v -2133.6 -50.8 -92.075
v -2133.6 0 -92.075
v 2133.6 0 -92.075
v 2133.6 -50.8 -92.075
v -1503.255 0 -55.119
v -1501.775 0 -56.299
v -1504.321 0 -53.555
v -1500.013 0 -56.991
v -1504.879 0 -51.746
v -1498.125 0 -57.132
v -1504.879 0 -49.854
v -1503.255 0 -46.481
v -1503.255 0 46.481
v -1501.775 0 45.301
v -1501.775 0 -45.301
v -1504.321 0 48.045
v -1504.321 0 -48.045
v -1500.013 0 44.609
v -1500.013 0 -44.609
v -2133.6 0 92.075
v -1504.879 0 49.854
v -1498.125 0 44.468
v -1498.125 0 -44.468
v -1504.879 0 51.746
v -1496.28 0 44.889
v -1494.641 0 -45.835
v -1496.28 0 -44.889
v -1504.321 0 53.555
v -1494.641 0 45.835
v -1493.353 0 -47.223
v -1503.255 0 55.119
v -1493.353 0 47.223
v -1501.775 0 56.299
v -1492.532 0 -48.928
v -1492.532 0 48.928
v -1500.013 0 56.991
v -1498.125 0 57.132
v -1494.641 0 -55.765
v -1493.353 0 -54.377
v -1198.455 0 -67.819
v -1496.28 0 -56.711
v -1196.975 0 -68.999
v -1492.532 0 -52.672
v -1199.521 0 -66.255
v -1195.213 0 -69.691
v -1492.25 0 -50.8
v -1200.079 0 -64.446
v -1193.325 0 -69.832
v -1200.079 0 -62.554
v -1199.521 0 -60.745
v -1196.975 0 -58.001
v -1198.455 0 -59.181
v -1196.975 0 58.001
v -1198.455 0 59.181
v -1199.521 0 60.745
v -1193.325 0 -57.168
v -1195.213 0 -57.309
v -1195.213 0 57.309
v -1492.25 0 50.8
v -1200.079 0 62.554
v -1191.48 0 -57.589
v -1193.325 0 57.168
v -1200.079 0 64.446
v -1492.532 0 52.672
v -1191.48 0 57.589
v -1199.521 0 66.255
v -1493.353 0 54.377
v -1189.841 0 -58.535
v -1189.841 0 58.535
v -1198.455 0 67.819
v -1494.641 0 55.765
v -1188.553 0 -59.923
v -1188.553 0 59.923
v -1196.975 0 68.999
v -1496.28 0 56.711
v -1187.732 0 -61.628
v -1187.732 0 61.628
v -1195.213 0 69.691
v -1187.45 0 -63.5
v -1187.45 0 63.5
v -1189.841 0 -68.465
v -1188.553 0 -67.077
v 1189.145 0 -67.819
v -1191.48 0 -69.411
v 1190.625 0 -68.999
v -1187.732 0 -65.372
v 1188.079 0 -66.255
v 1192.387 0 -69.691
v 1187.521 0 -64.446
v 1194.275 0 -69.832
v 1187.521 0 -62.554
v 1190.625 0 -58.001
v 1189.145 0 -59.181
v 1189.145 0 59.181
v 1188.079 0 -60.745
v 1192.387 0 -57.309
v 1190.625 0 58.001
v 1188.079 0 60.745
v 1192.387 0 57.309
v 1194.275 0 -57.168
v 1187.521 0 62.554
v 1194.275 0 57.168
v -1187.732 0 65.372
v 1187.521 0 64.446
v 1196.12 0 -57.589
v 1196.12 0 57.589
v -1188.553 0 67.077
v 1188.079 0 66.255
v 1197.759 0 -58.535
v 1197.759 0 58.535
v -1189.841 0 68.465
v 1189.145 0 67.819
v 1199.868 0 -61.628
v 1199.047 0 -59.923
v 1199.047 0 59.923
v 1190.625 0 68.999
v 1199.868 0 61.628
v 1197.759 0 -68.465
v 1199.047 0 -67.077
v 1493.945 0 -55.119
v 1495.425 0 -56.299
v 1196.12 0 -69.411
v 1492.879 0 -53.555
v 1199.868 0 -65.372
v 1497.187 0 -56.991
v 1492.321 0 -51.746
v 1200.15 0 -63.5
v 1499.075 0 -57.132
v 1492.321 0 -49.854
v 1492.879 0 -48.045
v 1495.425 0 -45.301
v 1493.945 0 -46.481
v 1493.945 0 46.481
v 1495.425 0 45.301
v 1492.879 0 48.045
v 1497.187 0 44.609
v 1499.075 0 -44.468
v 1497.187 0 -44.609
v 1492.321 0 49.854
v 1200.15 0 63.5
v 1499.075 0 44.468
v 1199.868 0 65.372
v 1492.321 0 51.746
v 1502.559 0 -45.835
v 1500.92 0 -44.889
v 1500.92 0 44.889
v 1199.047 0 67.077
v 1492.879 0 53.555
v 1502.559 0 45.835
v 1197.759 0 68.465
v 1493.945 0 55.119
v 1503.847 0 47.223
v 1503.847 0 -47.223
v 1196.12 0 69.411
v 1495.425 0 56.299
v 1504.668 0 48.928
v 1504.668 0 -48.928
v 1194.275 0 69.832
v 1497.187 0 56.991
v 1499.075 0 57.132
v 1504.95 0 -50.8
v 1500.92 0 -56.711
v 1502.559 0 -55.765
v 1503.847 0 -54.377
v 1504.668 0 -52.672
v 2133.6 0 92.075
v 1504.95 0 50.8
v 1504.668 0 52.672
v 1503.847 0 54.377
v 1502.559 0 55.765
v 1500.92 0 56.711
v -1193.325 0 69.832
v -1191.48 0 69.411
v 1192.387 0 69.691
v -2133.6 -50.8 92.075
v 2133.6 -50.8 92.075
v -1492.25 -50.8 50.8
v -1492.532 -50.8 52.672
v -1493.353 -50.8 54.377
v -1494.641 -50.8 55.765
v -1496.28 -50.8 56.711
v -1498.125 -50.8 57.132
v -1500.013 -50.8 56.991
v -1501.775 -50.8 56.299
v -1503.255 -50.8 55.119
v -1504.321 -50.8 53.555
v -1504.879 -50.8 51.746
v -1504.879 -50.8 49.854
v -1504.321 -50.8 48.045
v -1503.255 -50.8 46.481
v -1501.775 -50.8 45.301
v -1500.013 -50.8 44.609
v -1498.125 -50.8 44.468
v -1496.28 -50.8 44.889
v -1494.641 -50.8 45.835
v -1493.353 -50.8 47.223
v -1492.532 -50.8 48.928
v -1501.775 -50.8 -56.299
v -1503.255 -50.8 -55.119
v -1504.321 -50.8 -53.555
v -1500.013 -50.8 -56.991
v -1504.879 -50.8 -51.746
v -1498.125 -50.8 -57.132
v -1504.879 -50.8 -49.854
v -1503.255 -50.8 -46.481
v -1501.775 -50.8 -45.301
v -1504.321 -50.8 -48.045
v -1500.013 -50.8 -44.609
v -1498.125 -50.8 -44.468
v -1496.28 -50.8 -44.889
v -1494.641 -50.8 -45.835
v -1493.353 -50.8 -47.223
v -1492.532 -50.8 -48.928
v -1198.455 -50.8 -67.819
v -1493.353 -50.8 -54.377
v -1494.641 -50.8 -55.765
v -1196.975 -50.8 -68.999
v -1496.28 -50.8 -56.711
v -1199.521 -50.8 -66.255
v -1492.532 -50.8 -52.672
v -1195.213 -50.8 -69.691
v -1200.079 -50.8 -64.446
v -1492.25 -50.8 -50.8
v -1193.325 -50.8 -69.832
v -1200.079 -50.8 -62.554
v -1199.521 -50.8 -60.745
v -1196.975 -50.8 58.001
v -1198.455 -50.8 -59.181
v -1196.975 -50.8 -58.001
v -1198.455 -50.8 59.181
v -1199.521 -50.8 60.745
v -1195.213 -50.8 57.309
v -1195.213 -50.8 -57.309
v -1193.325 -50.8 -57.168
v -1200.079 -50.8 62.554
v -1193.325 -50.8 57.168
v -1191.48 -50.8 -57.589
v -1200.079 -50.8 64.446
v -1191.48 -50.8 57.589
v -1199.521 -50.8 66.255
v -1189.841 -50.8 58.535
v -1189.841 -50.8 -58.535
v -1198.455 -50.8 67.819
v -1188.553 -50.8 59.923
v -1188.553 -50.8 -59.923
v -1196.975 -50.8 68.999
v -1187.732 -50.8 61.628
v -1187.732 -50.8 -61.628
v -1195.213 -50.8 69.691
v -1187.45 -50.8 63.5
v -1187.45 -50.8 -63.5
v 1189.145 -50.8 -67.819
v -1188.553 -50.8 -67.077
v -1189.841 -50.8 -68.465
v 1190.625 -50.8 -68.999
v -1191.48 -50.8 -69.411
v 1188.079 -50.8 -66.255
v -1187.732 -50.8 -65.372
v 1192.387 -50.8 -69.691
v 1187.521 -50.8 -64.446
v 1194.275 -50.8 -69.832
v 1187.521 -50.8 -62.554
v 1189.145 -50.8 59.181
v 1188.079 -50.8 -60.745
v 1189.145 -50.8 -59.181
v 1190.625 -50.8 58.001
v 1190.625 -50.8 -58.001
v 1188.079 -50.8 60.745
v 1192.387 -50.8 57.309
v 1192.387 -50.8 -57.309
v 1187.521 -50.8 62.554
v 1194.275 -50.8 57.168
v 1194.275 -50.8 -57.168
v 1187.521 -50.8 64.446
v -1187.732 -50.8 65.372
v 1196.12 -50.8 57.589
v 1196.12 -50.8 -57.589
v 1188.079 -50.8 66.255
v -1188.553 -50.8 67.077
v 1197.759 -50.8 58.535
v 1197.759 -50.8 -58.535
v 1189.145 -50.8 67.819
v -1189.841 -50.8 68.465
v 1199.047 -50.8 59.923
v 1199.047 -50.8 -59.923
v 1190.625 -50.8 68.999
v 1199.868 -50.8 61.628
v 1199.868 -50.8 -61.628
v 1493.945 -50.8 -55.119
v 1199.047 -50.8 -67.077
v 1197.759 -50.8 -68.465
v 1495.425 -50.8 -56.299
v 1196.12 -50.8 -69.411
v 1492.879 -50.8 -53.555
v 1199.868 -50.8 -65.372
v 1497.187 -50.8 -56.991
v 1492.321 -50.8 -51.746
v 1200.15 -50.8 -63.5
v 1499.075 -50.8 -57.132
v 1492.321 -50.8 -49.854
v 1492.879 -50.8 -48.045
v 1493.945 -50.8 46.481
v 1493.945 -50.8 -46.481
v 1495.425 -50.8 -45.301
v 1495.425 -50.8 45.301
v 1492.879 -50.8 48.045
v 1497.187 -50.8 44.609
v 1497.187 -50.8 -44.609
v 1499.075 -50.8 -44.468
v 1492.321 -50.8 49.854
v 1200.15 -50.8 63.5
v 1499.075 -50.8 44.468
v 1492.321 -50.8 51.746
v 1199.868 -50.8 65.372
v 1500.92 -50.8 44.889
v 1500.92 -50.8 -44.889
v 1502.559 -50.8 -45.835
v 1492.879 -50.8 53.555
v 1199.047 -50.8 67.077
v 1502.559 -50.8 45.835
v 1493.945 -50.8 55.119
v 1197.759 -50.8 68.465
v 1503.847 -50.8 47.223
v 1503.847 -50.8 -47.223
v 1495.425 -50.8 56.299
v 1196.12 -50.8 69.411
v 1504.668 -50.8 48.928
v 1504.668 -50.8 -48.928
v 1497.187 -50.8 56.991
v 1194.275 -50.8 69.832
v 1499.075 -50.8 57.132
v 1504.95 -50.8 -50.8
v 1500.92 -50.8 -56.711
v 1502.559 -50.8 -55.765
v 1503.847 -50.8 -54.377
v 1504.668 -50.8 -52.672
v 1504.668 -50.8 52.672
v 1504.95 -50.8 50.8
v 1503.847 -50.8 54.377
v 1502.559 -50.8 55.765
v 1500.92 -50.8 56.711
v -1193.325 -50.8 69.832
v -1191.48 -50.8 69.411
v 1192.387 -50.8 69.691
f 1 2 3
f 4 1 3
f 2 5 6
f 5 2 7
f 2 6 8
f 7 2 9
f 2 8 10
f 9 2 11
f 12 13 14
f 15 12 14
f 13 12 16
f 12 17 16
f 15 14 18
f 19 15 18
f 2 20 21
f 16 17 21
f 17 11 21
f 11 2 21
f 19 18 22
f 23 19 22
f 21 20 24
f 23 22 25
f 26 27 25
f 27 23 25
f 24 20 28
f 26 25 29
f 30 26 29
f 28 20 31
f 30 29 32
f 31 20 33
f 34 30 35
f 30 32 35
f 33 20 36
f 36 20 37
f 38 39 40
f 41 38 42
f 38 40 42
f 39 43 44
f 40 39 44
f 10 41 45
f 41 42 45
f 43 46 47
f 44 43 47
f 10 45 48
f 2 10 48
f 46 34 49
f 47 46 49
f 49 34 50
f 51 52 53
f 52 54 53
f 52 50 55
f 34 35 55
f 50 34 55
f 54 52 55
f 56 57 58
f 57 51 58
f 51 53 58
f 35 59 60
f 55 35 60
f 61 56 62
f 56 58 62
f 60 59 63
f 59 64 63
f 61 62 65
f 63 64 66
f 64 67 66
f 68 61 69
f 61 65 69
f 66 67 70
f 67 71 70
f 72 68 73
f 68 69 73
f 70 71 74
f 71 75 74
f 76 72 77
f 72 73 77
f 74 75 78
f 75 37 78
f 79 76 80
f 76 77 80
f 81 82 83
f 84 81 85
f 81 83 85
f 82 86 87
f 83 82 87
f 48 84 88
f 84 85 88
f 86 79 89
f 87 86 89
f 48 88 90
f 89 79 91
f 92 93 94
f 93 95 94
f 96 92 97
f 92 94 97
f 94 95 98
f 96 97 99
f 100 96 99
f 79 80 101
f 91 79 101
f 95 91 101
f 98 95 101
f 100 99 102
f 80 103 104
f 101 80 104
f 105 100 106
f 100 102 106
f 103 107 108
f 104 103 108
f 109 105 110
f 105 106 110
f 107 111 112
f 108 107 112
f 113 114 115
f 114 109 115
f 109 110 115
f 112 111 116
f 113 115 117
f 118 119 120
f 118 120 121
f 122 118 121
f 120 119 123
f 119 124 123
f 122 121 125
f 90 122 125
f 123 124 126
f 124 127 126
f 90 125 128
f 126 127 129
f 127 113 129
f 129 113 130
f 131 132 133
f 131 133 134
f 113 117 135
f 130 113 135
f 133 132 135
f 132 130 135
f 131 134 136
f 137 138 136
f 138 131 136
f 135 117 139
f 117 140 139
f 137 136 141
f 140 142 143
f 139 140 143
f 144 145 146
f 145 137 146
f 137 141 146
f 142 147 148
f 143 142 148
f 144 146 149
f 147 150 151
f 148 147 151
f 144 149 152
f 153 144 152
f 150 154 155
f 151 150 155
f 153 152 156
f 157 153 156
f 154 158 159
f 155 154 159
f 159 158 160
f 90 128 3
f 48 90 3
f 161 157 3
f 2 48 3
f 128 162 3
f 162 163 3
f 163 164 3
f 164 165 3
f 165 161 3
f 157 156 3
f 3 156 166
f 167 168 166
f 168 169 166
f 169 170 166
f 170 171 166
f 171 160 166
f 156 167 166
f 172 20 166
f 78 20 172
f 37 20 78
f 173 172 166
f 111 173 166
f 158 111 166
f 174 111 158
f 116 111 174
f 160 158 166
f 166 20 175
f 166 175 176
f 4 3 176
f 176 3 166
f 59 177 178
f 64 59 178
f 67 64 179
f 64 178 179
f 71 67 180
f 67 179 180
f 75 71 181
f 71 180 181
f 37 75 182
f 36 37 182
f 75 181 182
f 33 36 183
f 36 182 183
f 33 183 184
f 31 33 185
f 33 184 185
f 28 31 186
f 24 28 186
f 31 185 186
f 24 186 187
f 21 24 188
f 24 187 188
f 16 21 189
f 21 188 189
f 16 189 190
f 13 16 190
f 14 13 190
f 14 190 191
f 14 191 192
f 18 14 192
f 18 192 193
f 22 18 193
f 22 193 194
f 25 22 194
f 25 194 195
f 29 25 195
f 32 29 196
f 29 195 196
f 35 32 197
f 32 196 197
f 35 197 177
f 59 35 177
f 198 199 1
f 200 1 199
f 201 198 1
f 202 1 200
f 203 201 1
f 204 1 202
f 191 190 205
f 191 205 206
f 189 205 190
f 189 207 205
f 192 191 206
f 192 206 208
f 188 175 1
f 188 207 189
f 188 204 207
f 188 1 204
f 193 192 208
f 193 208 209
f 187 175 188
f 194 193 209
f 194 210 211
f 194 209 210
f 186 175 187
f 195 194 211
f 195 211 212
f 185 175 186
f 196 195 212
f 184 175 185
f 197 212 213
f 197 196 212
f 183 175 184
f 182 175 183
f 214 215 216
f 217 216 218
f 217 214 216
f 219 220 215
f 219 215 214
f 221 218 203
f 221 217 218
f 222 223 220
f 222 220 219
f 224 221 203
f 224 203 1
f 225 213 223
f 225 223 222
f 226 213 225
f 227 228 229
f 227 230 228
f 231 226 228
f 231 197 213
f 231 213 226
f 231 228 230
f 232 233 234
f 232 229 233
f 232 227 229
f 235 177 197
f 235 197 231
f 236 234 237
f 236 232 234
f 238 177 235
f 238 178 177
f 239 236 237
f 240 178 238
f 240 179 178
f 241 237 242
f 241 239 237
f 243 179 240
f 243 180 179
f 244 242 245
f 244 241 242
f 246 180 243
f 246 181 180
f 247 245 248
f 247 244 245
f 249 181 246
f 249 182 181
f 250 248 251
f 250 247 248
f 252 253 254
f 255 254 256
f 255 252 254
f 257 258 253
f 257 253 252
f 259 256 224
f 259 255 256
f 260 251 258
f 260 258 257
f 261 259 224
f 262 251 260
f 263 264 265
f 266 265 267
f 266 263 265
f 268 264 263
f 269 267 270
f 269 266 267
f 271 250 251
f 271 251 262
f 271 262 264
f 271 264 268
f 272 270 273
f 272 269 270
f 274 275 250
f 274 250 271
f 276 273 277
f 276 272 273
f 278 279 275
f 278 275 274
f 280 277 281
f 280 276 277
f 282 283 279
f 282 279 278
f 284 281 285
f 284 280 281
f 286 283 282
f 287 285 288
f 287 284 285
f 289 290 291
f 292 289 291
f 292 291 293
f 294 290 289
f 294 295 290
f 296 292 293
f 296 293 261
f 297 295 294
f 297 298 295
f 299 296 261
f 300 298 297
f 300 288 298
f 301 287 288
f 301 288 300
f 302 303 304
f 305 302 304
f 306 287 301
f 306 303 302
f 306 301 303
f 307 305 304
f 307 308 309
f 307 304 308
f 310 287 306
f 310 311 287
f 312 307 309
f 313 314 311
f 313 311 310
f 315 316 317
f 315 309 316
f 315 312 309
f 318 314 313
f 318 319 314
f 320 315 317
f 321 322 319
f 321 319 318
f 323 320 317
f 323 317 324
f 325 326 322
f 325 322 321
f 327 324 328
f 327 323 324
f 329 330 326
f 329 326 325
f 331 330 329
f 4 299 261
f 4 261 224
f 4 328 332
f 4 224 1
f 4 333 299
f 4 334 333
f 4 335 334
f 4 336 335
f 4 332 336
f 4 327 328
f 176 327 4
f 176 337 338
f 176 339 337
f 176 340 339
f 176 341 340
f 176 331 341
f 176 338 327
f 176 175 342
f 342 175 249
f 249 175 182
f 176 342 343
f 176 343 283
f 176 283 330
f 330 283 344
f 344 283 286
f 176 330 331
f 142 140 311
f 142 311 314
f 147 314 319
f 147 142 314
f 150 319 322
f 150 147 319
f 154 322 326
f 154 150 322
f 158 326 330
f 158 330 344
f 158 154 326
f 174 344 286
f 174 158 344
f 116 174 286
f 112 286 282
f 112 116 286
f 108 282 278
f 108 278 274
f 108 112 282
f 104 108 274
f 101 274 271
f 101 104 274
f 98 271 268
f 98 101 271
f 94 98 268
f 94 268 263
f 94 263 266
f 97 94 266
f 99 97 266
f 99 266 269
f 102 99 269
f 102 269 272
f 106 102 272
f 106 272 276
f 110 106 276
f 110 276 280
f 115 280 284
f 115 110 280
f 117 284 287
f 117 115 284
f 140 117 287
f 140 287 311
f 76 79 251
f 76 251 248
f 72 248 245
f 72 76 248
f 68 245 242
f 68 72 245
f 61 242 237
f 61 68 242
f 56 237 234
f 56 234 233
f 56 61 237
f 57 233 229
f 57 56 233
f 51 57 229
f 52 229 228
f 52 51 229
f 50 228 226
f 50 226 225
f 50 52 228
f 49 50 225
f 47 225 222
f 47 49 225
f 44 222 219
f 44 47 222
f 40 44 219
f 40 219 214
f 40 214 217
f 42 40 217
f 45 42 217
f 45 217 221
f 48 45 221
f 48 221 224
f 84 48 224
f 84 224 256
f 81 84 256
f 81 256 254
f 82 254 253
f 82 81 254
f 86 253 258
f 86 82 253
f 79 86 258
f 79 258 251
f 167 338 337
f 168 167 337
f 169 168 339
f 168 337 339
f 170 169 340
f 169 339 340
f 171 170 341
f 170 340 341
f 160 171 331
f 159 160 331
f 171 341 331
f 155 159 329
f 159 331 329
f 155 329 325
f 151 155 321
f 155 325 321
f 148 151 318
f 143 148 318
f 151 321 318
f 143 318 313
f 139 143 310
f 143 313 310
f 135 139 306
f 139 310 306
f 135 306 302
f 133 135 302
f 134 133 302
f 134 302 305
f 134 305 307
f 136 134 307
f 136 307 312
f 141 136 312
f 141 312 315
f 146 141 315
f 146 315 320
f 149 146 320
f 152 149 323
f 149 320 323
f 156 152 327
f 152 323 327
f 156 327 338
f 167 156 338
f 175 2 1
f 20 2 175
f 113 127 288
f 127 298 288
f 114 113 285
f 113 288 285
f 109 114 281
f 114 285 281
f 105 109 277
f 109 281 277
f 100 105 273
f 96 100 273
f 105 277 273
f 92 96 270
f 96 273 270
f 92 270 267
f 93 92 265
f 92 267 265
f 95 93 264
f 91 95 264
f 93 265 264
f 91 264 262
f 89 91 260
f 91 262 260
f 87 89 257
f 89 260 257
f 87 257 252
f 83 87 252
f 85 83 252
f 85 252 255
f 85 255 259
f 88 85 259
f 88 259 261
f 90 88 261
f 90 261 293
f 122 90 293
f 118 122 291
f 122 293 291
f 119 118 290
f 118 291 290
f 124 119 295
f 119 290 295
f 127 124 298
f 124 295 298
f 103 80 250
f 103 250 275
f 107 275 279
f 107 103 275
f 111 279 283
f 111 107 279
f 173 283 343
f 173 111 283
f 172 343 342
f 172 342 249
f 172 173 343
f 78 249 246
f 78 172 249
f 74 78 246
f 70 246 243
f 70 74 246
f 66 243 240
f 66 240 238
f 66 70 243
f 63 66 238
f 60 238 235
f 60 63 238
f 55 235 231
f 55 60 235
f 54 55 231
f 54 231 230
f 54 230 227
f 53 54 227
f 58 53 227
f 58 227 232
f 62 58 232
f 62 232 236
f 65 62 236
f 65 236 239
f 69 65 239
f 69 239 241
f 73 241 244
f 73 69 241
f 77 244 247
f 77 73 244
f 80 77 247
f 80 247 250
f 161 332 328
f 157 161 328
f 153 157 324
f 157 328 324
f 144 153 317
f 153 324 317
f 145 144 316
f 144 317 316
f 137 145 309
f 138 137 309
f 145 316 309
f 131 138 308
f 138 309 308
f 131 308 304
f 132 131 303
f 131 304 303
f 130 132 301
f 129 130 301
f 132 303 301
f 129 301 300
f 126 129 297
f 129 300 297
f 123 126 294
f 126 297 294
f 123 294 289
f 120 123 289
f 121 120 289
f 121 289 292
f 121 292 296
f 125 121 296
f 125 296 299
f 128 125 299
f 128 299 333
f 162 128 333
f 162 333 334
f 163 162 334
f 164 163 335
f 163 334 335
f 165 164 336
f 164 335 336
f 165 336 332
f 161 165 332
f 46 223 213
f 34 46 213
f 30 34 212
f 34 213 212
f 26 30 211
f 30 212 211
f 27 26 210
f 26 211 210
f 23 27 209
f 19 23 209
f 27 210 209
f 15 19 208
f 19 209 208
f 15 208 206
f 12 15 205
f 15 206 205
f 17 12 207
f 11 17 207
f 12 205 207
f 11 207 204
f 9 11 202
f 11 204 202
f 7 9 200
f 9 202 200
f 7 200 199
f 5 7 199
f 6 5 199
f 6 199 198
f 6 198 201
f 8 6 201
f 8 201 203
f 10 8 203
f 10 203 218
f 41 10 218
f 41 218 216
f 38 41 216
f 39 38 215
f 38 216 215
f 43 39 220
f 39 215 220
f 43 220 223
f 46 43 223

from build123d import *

# Parameters (mm, degrees)
F0_W     = 4267.2
F0_H     = 184.15
F1_DEPTH = 50.8
F2_R     = 6.35
F3_DEPTH = 50.8
F4_R     = 6.35
F5_DEPTH = 50.8


with BuildPart() as f1:
    # F0 (on Front) → F1 (new body)
    with BuildSketch(Plane.XZ):
        Rectangle(F0_W, F0_H)
    extrude(amount=F1_DEPTH)

    # F2 (on face) → F3 (cut)
    with BuildSketch(Plane.XZ.offset(50.8)):
        with Locations((1498.6, 50.8)):
            Circle(F2_R)
        with Locations((1498.6, -50.8)):
            Circle(F2_R)
        with Locations((-1498.6, 50.8)):
            Circle(F2_R)
        with Locations((-1498.6, -50.8)):
            Circle(F2_R)
    extrude(amount=-F3_DEPTH, mode=Mode.SUBTRACT)

    # F4 (on Front) → F5 (cut, symmetric)
    with BuildSketch(Plane.XZ):
        with Locations((-1193.8, 63.5)):
            Circle(F4_R)
        with Locations((-1193.8, -63.5)):
            Circle(F4_R)
        with Locations((1193.8, 63.5)):
            Circle(F4_R)
        with Locations((1193.8, -63.5)):
            Circle(F4_R)
    extrude(amount=F5_DEPTH, both=True, mode=Mode.SUBTRACT)


solid = f1.part
